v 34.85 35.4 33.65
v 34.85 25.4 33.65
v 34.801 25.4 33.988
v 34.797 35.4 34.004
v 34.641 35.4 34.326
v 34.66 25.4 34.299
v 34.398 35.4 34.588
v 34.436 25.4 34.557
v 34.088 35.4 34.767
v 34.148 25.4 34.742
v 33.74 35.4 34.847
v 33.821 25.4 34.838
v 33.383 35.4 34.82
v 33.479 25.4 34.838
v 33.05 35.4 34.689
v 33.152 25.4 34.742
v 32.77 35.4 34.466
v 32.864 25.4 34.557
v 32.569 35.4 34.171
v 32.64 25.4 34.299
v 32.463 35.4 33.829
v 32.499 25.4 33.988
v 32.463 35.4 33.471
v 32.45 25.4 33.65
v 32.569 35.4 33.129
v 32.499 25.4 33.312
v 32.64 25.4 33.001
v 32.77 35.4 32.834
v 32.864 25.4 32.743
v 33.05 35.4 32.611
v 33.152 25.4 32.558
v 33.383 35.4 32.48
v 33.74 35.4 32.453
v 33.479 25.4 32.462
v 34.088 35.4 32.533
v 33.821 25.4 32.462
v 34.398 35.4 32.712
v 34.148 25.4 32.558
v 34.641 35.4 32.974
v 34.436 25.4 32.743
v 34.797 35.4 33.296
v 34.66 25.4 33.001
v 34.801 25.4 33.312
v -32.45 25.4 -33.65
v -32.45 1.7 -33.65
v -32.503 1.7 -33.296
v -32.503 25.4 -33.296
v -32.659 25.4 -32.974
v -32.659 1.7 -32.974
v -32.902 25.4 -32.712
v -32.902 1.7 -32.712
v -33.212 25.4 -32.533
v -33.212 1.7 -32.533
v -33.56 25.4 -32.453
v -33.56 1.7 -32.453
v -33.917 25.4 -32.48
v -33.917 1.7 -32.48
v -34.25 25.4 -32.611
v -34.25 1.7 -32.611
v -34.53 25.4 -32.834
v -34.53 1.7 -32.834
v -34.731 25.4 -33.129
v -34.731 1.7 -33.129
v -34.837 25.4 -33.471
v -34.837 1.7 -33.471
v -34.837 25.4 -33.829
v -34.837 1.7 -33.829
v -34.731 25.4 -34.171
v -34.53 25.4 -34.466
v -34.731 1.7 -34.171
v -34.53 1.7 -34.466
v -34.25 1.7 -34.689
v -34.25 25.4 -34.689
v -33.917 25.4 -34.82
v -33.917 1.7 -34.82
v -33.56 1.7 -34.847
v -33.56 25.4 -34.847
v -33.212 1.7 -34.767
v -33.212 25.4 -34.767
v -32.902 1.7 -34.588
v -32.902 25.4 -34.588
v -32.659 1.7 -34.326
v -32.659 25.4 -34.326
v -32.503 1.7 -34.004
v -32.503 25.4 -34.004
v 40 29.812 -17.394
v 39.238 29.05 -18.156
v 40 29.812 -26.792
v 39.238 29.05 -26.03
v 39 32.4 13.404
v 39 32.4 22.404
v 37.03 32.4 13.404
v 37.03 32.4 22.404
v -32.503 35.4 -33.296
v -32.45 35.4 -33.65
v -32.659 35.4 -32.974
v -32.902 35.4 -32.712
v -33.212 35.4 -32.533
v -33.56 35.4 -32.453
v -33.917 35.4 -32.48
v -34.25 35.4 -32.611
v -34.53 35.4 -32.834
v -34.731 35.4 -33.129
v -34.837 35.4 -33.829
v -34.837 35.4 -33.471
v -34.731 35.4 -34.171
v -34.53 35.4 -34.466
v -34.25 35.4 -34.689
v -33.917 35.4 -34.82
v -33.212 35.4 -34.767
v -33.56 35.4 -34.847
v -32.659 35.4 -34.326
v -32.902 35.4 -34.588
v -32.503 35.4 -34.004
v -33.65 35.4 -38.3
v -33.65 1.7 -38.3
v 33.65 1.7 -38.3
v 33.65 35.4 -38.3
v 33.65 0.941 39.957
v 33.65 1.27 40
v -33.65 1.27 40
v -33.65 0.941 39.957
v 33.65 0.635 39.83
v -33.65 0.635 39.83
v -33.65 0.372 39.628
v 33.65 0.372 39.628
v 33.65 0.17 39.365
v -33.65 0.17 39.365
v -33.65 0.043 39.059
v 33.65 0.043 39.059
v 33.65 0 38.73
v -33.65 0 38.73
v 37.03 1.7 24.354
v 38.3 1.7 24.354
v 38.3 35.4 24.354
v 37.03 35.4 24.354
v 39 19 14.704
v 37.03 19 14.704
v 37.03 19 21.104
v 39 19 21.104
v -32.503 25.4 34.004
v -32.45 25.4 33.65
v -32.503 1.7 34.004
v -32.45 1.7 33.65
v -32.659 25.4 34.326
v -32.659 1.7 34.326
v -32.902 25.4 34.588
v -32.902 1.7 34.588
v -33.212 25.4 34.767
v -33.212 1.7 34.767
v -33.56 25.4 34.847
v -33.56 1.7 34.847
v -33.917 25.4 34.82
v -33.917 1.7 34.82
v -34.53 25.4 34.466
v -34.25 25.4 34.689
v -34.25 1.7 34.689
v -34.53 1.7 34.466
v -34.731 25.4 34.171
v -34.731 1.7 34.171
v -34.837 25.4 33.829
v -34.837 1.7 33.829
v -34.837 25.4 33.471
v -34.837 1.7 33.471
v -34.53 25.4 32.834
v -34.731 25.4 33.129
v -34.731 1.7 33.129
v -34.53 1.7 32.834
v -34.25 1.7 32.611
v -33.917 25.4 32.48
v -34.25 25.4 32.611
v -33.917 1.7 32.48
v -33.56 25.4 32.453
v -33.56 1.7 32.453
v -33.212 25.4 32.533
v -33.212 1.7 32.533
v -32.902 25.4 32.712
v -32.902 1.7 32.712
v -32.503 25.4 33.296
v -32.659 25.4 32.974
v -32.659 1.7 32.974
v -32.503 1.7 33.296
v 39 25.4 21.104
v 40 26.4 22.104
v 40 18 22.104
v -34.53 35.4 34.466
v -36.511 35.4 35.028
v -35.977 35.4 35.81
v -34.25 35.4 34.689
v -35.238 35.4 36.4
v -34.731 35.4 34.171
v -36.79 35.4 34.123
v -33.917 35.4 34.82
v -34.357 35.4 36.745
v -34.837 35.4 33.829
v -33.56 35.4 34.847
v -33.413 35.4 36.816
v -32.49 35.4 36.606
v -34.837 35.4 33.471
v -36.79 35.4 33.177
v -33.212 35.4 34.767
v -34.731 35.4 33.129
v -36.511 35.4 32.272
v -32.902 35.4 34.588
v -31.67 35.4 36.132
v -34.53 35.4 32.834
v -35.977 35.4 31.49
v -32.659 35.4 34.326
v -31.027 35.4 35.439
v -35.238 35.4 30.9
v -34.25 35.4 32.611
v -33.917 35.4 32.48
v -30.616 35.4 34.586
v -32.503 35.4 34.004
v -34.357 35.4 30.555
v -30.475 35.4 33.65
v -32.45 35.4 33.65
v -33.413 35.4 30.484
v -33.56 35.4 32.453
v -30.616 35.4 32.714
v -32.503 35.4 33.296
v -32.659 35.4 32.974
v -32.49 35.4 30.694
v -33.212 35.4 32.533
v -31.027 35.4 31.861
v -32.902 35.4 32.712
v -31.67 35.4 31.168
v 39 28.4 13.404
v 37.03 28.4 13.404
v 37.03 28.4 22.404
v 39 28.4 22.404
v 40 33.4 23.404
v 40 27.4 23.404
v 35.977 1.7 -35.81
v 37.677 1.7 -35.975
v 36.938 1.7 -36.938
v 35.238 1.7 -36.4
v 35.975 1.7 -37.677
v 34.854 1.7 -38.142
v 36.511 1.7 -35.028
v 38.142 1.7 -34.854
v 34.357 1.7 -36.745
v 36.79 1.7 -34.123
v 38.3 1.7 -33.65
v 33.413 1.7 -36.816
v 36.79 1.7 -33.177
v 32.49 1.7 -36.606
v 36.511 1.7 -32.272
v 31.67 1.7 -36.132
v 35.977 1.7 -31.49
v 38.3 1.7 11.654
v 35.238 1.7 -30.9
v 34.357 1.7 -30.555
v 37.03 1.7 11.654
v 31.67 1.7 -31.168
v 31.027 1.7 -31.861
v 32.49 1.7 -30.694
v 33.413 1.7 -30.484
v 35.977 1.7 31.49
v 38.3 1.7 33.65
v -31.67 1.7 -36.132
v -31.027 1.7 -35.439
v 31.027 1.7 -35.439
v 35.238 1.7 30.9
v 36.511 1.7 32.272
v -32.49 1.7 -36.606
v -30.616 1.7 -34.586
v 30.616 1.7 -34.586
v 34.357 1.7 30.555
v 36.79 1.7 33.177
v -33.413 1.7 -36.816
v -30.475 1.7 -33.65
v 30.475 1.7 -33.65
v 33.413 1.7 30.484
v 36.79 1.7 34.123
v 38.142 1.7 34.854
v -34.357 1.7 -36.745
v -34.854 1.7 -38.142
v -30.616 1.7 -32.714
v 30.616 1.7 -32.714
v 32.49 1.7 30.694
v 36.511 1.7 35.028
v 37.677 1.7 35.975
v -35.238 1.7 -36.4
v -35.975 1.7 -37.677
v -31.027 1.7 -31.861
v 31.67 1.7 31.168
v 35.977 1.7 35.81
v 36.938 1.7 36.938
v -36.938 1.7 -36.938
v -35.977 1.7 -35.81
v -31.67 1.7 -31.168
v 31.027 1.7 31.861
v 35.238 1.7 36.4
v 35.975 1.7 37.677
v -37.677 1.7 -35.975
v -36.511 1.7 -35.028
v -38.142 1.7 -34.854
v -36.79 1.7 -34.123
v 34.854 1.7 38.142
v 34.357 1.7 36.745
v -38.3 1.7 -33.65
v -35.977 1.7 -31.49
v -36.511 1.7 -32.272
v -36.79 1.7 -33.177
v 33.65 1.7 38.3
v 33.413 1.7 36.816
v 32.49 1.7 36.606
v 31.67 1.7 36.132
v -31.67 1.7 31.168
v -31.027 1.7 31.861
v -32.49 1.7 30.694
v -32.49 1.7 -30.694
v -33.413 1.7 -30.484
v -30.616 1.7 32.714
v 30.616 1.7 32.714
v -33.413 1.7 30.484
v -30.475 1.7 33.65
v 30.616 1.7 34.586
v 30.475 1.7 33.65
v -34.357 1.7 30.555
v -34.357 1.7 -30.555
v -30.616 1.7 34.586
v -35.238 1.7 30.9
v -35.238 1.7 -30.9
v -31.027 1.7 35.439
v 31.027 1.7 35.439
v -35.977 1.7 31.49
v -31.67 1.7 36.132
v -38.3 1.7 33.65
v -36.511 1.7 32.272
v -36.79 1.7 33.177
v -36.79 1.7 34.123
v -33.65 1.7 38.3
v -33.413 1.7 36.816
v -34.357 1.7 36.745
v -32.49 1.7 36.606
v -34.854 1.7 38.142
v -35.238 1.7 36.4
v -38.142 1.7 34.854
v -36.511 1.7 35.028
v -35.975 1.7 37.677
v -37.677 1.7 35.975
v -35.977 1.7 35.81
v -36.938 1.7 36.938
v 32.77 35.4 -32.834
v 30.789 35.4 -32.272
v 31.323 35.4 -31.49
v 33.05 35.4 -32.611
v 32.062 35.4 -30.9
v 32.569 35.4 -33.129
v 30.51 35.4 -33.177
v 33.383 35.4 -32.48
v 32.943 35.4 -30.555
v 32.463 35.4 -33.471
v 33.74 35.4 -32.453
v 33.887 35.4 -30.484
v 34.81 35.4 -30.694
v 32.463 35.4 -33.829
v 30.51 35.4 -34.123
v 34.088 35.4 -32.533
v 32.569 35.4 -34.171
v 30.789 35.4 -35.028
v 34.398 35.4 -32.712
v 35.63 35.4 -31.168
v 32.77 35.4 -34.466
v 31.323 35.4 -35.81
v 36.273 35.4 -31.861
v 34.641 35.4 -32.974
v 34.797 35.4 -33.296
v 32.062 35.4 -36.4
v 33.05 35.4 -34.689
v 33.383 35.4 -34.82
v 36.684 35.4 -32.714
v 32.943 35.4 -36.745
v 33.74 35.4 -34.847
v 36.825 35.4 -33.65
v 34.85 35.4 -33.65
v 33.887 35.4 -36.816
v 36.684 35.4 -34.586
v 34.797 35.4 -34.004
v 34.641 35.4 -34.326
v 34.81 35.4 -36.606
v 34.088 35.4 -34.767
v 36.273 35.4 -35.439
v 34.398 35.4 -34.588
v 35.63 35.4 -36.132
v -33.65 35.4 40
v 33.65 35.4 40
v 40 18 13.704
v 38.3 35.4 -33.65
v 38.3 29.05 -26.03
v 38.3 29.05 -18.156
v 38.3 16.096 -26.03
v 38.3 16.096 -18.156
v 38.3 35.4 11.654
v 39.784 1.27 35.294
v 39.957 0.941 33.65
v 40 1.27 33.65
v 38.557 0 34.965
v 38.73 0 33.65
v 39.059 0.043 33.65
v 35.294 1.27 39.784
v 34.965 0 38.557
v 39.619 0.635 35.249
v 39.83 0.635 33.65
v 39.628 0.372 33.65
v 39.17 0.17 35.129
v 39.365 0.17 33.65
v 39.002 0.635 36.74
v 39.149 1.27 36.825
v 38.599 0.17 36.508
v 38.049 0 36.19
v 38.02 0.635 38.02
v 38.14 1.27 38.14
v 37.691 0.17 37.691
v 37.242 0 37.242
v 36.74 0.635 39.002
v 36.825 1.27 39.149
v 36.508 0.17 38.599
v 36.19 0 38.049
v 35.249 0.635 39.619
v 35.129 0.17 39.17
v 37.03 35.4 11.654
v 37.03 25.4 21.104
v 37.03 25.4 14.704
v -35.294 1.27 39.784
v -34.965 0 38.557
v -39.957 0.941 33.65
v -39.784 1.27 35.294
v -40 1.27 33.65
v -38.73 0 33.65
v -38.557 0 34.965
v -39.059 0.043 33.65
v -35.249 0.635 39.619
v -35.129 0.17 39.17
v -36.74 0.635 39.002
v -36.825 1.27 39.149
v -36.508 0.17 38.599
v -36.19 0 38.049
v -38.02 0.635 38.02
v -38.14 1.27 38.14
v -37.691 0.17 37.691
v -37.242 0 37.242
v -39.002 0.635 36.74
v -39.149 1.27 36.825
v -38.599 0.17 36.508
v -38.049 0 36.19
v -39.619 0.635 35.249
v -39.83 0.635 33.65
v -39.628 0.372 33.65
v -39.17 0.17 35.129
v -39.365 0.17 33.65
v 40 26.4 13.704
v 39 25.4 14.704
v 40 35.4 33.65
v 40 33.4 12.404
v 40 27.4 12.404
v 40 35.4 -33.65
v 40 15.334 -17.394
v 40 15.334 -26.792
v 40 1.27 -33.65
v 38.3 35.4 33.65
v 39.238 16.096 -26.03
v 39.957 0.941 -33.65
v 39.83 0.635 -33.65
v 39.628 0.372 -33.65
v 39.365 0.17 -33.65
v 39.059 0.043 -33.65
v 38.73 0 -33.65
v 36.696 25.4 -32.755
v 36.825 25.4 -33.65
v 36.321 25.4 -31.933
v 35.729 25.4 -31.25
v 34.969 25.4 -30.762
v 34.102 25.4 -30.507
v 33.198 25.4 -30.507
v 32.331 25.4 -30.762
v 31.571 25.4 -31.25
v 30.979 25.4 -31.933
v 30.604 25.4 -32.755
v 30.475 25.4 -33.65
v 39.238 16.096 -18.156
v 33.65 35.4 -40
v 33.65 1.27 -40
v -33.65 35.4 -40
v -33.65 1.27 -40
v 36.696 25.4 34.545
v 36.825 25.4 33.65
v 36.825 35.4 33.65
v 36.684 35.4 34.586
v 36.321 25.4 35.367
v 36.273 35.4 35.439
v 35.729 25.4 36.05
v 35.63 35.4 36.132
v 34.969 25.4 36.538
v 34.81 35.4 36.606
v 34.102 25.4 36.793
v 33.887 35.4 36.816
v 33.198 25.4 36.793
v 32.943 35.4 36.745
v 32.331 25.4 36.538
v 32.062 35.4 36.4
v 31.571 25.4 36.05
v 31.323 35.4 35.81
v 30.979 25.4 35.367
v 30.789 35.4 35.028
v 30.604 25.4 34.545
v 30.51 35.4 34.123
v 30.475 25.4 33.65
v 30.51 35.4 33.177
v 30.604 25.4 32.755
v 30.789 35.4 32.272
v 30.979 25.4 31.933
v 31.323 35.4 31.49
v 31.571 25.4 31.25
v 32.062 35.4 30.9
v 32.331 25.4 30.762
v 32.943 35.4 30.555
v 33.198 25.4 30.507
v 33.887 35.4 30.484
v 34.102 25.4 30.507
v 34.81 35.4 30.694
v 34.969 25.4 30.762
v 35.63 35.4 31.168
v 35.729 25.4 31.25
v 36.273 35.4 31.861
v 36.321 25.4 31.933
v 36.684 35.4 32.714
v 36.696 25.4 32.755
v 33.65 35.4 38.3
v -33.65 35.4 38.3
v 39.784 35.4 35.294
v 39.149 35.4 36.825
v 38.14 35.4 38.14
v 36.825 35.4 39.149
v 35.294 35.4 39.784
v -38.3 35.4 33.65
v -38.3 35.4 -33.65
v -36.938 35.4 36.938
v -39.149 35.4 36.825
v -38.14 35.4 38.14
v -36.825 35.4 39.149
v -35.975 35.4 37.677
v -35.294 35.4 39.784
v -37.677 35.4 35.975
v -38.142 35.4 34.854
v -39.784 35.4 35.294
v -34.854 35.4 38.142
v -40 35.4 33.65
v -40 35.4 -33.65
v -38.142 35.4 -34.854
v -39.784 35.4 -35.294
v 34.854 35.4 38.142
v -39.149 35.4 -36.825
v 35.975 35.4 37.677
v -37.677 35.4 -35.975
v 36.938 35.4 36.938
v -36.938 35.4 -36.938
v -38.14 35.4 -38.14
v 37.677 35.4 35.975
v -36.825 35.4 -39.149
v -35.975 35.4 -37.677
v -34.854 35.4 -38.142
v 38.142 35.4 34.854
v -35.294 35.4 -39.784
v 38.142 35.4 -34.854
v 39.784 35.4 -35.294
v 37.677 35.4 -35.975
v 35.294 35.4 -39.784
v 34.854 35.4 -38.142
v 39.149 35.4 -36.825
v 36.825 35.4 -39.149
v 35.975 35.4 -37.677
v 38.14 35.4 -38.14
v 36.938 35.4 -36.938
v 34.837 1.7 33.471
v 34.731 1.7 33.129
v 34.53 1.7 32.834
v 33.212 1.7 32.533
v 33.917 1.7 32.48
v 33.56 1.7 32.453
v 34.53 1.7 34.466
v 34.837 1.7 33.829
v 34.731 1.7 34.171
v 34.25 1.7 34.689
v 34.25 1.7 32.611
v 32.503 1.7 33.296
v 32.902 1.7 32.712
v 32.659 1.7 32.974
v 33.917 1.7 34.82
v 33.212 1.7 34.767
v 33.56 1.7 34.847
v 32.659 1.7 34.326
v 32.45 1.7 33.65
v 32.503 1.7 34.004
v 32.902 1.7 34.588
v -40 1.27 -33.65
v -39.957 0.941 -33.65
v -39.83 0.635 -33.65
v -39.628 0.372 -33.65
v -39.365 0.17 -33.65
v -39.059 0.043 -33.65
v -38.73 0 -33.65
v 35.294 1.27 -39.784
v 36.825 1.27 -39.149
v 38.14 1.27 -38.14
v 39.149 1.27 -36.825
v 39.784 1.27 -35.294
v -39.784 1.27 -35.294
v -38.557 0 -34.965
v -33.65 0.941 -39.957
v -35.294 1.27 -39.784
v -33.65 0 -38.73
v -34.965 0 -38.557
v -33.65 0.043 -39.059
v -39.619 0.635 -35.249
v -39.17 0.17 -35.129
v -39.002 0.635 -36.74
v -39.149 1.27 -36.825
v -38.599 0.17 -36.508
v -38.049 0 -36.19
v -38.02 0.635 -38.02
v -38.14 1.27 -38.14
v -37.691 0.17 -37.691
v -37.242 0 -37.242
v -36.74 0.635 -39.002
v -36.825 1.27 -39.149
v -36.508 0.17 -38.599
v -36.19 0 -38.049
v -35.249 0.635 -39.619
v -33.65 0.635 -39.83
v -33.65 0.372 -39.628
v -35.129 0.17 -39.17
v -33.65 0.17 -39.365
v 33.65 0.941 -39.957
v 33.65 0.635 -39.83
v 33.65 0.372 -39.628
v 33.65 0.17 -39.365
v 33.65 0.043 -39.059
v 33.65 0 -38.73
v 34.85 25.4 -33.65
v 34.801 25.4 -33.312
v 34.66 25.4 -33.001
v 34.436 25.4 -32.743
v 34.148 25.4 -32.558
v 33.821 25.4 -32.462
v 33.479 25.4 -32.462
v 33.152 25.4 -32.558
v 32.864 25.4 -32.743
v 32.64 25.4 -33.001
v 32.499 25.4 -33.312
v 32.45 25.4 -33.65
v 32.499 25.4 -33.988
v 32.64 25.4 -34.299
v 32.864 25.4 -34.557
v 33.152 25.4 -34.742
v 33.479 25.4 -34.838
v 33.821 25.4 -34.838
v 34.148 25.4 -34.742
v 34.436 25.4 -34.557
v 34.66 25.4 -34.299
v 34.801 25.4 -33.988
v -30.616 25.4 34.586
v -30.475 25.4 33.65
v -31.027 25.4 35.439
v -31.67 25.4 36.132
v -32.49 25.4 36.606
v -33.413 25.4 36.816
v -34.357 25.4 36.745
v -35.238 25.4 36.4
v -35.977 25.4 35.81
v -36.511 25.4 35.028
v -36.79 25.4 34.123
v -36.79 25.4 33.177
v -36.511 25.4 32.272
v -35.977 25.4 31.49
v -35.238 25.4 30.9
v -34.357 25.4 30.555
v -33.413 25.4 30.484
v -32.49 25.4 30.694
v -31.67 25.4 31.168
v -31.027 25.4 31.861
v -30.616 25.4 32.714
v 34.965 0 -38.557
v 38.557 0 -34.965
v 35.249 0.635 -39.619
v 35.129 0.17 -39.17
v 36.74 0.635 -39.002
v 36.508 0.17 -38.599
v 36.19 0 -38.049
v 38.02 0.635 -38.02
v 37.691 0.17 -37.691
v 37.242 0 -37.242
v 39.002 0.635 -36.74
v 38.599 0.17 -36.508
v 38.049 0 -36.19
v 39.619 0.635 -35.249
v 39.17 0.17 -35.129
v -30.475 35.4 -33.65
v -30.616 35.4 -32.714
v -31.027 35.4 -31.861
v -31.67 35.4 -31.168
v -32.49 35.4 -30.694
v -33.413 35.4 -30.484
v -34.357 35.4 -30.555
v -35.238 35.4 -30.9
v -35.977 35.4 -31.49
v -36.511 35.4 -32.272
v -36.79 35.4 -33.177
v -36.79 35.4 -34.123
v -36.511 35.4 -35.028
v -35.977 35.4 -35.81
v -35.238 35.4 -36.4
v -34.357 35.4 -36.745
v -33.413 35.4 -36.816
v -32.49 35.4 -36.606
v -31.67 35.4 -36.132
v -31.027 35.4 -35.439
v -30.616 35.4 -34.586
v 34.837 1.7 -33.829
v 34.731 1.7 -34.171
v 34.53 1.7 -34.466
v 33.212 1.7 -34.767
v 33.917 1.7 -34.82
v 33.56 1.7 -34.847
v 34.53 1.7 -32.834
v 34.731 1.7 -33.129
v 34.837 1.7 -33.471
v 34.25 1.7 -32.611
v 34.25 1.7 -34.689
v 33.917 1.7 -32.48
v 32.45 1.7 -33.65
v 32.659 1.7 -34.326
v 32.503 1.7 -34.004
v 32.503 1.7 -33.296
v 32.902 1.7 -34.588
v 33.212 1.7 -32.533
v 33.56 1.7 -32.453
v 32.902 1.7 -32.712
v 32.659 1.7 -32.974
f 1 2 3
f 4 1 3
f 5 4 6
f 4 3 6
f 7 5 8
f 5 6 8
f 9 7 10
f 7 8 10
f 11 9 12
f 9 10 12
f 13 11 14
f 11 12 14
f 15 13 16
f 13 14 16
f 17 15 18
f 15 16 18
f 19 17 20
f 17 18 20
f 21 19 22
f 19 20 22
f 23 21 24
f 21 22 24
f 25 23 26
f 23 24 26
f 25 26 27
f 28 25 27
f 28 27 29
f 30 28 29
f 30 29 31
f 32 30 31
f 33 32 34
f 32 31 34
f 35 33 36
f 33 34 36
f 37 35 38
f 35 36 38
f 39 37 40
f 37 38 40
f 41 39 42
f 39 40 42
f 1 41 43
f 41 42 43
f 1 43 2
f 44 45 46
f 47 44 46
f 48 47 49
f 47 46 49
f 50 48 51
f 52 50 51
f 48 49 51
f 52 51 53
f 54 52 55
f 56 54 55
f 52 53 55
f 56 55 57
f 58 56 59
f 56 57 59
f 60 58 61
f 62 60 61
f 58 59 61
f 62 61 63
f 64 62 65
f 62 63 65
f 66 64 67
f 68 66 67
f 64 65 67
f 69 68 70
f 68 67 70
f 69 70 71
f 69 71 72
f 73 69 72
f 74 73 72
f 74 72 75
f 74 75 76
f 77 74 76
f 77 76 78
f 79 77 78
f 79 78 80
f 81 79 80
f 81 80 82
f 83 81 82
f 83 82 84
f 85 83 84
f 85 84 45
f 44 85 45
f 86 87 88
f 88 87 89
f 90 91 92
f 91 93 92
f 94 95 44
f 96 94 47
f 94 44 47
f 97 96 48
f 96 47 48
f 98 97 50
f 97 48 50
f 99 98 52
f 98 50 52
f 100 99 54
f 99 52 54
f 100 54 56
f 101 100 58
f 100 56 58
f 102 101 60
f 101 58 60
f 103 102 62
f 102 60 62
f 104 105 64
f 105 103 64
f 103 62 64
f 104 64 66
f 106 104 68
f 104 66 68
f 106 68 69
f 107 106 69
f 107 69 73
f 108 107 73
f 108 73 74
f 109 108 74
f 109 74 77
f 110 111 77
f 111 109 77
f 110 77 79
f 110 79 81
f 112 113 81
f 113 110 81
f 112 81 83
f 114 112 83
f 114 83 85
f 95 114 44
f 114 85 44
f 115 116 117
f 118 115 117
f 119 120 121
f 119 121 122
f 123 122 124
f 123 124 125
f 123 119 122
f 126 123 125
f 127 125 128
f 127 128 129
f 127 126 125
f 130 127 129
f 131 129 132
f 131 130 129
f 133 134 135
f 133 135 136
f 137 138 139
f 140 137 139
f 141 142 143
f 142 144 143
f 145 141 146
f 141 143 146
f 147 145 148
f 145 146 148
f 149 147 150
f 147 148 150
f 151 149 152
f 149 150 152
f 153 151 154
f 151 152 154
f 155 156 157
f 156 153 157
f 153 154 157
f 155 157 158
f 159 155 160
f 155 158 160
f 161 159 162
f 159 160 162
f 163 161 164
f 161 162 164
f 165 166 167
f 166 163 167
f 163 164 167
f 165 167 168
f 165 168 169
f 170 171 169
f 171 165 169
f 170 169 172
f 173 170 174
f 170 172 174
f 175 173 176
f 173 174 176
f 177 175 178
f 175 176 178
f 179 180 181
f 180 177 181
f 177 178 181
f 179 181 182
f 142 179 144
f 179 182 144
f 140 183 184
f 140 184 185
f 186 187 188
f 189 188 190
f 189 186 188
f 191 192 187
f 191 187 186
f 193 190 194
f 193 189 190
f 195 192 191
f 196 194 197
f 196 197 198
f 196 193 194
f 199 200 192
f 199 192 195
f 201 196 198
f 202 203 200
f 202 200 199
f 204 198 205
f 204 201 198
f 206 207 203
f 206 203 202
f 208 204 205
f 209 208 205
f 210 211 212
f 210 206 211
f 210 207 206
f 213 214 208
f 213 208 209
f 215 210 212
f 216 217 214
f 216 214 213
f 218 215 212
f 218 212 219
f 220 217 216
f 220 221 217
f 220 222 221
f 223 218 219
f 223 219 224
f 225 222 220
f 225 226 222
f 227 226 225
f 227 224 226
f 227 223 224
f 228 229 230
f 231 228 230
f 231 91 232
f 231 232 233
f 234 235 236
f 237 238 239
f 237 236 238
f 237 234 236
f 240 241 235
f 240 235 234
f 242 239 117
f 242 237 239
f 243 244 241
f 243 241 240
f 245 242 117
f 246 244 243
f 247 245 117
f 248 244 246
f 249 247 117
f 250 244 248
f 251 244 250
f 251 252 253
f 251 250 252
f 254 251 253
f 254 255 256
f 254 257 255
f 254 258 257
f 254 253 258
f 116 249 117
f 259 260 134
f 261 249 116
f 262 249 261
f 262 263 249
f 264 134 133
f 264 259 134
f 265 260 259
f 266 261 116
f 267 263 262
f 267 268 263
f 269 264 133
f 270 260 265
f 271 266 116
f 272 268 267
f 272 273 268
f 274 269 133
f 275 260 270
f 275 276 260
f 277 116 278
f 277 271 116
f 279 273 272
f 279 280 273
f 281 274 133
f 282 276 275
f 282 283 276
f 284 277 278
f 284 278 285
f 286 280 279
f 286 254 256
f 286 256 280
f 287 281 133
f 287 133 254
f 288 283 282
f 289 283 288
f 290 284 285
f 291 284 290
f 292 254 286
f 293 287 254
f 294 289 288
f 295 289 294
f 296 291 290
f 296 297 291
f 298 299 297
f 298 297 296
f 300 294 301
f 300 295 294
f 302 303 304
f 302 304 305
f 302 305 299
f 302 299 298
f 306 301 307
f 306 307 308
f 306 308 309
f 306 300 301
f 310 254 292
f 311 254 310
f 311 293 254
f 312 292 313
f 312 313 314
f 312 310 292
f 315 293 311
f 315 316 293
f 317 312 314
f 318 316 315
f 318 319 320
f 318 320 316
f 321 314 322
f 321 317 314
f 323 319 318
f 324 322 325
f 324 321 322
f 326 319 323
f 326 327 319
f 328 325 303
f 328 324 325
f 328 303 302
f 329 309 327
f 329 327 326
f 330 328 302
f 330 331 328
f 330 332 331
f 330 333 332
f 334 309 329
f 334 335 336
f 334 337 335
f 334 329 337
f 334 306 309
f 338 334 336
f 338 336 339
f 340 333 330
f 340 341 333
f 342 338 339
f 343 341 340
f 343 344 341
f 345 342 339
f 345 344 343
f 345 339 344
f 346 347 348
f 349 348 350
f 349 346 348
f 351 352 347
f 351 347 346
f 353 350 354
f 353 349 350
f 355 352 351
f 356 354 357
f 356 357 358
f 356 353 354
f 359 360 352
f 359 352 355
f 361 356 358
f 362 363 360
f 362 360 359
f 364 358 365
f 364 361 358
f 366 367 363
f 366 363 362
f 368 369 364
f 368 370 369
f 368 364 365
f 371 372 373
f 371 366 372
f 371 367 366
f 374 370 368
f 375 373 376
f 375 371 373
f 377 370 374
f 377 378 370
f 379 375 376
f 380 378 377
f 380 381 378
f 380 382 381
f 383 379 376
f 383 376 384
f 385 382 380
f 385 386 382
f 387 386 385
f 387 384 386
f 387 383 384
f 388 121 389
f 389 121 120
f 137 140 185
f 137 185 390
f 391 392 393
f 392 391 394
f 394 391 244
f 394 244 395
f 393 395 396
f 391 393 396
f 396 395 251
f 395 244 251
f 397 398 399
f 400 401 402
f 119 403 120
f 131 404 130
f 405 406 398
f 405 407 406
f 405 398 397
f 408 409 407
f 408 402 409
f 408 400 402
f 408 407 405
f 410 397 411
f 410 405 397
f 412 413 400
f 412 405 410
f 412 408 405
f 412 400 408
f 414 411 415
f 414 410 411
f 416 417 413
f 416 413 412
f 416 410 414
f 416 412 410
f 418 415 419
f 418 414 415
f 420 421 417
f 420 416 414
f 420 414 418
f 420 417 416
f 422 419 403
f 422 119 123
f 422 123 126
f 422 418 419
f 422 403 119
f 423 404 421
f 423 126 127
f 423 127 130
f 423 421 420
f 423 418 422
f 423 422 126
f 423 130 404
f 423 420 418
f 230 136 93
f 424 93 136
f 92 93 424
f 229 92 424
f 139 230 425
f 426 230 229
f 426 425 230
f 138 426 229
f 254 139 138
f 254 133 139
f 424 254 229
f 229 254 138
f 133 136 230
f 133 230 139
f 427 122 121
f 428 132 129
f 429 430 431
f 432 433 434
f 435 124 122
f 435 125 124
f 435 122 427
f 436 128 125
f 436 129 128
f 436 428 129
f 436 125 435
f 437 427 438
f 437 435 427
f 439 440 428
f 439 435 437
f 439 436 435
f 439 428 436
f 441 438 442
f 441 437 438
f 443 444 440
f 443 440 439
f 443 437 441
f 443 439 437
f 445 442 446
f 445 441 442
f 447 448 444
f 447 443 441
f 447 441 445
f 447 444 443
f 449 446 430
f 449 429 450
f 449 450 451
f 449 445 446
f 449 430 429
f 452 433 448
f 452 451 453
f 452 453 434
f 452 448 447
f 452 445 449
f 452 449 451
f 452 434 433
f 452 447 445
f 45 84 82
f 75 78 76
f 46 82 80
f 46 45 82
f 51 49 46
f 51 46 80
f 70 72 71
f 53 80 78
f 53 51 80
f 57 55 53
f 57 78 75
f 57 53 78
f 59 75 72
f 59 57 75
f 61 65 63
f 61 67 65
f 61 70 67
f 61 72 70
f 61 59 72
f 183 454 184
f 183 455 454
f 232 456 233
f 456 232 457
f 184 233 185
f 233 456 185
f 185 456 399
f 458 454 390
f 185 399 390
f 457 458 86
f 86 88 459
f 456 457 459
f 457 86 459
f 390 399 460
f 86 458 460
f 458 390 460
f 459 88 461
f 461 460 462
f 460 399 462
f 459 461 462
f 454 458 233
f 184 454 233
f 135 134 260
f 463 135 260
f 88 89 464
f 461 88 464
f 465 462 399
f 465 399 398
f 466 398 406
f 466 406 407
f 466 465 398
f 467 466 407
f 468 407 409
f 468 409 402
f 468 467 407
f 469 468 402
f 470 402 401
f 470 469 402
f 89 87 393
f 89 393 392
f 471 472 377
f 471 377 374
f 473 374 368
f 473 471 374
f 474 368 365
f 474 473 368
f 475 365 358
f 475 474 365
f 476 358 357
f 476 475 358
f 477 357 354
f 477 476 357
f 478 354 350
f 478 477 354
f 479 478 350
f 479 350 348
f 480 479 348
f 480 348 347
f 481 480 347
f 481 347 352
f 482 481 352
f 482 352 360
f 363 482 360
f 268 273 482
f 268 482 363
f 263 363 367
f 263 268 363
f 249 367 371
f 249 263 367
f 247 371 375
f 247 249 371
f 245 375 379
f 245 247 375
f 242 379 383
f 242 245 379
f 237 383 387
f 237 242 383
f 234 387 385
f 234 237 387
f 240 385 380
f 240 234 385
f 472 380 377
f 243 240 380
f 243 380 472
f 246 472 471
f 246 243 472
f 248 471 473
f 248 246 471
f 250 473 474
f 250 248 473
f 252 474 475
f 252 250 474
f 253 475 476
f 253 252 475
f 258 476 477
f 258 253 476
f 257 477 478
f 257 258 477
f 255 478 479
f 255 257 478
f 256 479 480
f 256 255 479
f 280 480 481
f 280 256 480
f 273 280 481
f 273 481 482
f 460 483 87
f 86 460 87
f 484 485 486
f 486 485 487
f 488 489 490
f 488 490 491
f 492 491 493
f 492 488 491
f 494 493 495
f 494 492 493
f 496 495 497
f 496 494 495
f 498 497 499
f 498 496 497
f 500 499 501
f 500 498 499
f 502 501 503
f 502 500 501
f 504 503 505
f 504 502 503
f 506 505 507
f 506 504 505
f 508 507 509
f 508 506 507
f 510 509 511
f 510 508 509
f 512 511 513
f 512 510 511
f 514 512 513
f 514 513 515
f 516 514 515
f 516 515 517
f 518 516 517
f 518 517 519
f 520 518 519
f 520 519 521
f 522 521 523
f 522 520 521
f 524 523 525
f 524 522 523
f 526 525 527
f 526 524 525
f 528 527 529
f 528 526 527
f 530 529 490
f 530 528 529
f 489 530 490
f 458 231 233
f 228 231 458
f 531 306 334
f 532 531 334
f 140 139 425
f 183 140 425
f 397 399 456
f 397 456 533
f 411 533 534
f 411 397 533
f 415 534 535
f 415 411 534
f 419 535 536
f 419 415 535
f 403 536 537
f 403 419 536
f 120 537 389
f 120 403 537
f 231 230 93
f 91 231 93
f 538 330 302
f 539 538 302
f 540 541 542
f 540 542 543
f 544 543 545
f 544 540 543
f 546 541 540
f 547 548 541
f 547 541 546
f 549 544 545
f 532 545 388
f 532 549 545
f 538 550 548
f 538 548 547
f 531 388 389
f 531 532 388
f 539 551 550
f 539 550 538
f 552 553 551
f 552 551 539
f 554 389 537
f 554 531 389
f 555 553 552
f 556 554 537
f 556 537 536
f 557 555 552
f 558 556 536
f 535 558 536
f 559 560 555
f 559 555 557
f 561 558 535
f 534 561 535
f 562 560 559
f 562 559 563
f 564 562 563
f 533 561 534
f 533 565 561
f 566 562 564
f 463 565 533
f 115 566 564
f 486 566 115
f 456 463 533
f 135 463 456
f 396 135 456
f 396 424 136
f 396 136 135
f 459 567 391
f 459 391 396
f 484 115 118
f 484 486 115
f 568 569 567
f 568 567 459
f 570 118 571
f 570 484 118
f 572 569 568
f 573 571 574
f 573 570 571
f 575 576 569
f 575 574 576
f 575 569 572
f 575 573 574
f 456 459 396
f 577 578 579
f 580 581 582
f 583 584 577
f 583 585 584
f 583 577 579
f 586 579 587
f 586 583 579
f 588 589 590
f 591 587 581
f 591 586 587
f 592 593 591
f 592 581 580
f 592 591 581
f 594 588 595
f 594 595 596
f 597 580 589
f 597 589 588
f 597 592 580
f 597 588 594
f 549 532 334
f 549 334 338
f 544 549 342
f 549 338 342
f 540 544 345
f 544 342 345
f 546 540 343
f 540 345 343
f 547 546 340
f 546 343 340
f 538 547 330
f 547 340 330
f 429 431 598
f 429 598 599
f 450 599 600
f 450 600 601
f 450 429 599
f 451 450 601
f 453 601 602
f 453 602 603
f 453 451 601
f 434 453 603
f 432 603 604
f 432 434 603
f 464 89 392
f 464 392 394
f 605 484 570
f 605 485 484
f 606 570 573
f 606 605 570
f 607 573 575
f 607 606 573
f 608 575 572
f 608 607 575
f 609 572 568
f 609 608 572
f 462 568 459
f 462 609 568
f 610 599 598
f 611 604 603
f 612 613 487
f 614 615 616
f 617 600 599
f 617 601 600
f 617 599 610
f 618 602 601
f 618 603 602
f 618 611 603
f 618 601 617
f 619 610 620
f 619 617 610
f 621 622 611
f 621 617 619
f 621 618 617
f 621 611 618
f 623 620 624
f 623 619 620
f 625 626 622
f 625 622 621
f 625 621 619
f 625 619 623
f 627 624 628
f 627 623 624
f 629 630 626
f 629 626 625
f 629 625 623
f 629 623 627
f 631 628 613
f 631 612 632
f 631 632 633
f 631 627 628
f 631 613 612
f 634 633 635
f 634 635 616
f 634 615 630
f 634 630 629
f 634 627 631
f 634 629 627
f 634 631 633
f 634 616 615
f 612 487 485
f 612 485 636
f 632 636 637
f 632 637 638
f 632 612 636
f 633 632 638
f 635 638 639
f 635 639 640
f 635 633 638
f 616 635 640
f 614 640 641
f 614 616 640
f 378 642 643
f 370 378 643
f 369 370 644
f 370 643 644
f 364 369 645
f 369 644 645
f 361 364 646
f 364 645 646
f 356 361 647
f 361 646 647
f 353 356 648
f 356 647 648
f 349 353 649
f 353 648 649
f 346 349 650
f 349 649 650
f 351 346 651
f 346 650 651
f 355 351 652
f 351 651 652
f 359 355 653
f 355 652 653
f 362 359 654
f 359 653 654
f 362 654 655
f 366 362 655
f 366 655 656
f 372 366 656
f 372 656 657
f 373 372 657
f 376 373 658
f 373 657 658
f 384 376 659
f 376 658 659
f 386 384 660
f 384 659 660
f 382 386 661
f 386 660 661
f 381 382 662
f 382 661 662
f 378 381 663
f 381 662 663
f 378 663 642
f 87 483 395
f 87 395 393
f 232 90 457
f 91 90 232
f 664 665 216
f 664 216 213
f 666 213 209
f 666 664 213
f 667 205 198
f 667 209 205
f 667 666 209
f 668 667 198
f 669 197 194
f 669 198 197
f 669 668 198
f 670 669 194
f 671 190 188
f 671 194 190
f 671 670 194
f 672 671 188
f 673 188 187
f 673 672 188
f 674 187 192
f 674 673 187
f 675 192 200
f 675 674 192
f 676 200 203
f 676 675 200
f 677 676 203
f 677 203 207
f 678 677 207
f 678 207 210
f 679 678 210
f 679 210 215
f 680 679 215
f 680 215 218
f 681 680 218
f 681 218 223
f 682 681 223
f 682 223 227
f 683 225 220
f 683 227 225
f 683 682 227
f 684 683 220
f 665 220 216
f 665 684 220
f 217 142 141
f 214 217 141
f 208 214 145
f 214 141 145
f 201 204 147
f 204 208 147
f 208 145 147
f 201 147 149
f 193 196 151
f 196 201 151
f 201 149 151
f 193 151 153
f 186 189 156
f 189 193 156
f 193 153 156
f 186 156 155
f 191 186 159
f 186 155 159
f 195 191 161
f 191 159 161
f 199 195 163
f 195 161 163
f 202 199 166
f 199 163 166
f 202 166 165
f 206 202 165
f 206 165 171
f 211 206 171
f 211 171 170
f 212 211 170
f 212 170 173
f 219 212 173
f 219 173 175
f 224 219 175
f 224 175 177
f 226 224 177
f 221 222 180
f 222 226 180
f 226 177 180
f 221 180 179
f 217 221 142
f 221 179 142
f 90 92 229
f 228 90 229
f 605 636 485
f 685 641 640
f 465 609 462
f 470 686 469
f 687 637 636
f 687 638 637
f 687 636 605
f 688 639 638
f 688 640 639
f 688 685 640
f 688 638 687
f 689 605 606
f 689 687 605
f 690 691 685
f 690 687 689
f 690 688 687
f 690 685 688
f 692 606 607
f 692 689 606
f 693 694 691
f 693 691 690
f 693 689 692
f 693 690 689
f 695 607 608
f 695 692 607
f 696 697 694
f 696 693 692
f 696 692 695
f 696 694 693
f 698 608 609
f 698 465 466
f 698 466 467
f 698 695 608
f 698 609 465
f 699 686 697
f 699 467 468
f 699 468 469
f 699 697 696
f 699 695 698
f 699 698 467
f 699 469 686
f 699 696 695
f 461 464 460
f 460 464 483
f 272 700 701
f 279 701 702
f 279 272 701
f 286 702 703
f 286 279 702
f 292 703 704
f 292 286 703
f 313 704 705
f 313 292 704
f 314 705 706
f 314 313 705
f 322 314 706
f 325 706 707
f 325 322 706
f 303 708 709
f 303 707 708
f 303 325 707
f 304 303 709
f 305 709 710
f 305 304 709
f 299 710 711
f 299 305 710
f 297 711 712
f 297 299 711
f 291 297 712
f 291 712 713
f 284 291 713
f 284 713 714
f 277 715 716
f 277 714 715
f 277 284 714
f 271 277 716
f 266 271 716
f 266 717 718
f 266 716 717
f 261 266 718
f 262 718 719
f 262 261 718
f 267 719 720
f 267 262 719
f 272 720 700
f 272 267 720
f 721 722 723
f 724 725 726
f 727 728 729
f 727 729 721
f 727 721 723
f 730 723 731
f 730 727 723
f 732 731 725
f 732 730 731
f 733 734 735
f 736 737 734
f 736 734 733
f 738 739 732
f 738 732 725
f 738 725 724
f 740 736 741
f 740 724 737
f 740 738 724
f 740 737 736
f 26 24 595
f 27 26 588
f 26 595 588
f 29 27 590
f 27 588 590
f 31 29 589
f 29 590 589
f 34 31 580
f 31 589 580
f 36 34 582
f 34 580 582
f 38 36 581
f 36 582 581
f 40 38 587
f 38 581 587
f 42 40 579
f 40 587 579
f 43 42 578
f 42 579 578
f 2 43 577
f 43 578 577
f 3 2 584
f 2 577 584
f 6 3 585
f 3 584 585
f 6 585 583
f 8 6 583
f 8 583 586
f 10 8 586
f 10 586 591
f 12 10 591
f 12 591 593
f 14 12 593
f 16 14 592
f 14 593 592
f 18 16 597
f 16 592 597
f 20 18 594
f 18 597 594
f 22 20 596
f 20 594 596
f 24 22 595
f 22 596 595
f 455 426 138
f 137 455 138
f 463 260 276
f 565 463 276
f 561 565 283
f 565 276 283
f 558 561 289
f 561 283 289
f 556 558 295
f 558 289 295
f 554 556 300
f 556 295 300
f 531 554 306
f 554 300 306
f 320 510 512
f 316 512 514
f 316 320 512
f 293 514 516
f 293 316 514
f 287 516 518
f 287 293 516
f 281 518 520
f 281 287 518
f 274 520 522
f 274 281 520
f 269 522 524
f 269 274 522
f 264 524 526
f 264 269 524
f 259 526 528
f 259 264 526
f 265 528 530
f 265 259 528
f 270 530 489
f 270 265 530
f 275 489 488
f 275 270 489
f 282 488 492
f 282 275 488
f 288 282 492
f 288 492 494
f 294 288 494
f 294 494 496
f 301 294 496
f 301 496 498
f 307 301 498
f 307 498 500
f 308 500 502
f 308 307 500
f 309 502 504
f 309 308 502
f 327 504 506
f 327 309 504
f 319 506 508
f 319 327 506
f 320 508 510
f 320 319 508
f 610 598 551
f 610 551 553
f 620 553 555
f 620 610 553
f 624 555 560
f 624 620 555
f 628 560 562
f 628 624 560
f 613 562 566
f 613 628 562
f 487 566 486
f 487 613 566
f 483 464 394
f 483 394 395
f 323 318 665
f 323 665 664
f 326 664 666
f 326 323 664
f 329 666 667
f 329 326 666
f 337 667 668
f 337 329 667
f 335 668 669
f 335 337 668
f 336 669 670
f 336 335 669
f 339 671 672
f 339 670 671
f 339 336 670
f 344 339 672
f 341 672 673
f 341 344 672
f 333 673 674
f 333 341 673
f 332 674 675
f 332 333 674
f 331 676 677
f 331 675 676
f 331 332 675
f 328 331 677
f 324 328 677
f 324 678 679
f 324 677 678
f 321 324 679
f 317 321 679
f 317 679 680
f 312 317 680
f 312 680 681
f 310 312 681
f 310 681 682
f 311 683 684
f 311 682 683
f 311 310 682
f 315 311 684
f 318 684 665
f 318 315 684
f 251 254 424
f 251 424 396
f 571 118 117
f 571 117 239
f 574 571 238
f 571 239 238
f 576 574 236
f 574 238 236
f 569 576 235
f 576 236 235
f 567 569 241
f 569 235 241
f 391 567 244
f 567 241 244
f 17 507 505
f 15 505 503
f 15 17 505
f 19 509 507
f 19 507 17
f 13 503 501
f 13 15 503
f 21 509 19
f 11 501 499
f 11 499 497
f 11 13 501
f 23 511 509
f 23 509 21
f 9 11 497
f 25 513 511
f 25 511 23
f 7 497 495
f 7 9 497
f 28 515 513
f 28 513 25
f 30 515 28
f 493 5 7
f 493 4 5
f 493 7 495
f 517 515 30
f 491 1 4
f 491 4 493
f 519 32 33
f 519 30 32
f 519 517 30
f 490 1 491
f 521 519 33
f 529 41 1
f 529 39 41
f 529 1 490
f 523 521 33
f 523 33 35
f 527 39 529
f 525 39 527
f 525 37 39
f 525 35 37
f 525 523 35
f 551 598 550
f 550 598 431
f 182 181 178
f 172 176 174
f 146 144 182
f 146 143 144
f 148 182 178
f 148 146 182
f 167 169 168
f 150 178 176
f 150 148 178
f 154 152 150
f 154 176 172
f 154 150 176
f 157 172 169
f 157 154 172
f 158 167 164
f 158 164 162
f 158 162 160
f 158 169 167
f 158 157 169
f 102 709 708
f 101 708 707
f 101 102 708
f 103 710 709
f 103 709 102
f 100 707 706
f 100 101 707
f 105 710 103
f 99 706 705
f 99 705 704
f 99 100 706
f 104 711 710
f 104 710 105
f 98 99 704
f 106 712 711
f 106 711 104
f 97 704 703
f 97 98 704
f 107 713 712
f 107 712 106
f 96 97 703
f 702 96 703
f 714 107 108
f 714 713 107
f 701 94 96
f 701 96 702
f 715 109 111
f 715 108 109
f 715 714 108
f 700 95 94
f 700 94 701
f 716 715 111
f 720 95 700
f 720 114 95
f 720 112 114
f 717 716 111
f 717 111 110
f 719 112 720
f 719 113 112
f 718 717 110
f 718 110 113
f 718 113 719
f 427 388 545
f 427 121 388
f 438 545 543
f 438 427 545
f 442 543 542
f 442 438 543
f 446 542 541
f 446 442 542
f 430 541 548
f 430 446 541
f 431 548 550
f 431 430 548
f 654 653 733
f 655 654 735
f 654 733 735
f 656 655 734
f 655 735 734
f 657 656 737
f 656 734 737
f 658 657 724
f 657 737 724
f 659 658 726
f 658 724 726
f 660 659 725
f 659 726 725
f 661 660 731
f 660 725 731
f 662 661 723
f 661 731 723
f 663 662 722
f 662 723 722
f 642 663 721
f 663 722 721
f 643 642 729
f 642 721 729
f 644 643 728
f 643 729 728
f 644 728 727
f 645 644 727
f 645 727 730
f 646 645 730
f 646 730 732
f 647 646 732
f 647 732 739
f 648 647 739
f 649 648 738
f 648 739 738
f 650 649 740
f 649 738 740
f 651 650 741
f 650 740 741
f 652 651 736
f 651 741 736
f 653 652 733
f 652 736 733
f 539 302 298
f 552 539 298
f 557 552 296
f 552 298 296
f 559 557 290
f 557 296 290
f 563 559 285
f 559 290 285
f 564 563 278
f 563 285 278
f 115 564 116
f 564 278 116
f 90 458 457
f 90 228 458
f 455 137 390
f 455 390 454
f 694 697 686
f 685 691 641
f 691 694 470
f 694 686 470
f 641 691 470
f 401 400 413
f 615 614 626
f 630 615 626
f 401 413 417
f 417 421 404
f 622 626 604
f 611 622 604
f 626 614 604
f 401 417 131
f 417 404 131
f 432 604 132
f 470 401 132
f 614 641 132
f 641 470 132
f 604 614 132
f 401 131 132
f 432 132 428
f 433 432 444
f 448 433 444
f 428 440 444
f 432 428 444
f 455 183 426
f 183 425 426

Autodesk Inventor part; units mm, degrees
ref_plane "YZ Plane" through (0, 0, 0) normal (1, 0, 0) x (0, 1, 0)
ref_plane "XZ Plane" through (0, 0, 0) normal (0, 1, 0) x (-1, 0, 0)
ref_plane "XY Plane" through (0, 0, 0) normal (0, 0, 1) x (1, 0, 0)
sketch "Sketch1" plane through (0, 0, 0) normal (0, 1, 0) x (-1, 0, 0)
  line L0 (-33.65, -40) -> (33.65, -40)
  line L1 (40, -33.65) -> (40, 33.65)
  line L2 (33.65, 40) -> (-33.65, 40)
  line L3 (-40, 33.65) -> (-40, -33.65)
  line L4 (-40, -40) -> (40, 40) construction
  line L5 (40, -40) -> (-40, 40) construction
  arc A0 (40, 33.65) -> (33.65, 40) centre (33.65, 33.65) ccw
  arc A1 (-33.65, 40) -> (-40, 33.65) centre (-33.65, 33.65) ccw
  arc A2 (-40, -33.65) -> (-33.65, -40) centre (-33.65, -33.65) ccw
  arc A3 (33.65, -40) -> (40, -33.65) centre (33.65, -33.65) ccw
  point P0 (0, 0)
  dimension "d0" = 80
  dimension "d1" = 80
  dimension "d2" = 6.35
extrude "Extrusion1" add sketch "Sketch1" along normal blind 25.4
shell "Shell1" thickness 1.7 removed faces 1 at (-11.2167, 25.4, 9.1)
fillet "Fillet1" radius 1.27 8 edges at (-38.1401, 0, -38.1401) (-40, 0, 0) (-38.1401, 0, 38.1401) (0, 0, 40) (38.1401, 0, 38.1401) (40, 0, 0) (38.1401, 0, -38.1401) (0, 0, -40)
sketch "Sketch2" plane through (-33.65, 1.7, 38.3) normal (0, 1, 0) x (1, 0, 0)
  arc A0 (-4.65, 4.65) -> (0, 0) centre (0, 4.65) ccw projected
  circle A1 centre (0, 4.65) radius 3.175
  circle A2 centre (0, 4.65) radius 1.2
  point P0 (33.65, 38.3)
  dimension "d7" = 6.35
  dimension "d8" = 2.4
extrude "Extrusion2" add sketch "Sketch2" along normal up to surface (23.7 mm away)
mirror "Mirror1" about plane through (0, 0, 0) normal (1, 0, 0) of "Extrusion2"
mirror "Mirror2" about plane through (0, 0, 0) normal (0, 0, 1) of "Extrusion2", "Mirror1"
sketch "Sketch4" plane through (0, 25.4, 0) normal (0, 1, 0) x (1, 0, 0)
  line L0 (-38.3, -33.65) -> (-38.3, 33.65) projected
  arc A0 (-33.65, 38.3) -> (-38.3, 33.65) centre (-33.65, 33.65) ccw projected
  line L1 (-33.65, 38.3) -> (33.65, 38.3) projected
  arc A1 (38.3, 33.65) -> (33.65, 38.3) centre (33.65, 33.65) ccw projected
  line L2 (38.3, 33.65) -> (38.3, -33.65) projected
  arc A2 (33.65, -38.3) -> (38.3, -33.65) centre (33.65, -33.65) ccw projected
  line L3 (33.65, -38.3) -> (-33.65, -38.3) projected
  arc A3 (-38.3, -33.65) -> (-33.65, -38.3) centre (-33.65, -33.65) ccw projected
  arc A4 (-40, -33.65) -> (-33.65, -40) centre (-33.65, -33.65) ccw projected
  line L4 (-33.65, -40) -> (33.65, -40) projected
  arc A5 (33.65, -40) -> (40, -33.65) centre (33.65, -33.65) ccw projected
  line L5 (40, -33.65) -> (40, 33.65) projected
  arc A6 (40, 33.65) -> (33.65, 40) centre (33.65, 33.65) ccw projected
  line L6 (33.65, 40) -> (-33.65, 40) projected
  arc A7 (-33.65, 40) -> (-40, 33.65) centre (-33.65, 33.65) ccw projected
  line L7 (-40, 33.65) -> (-40, -33.65) projected
  circle A8 centre (-33.65, 33.65) radius 1.2 projected
  circle A9 centre (-33.65, 33.65) radius 3.175 projected
  circle A10 centre (-33.65, -33.65) radius 1.2 projected
  circle A11 centre (-33.65, -33.65) radius 3.175 projected
  circle A12 centre (33.65, -33.65) radius 1.2 projected
  circle A13 centre (33.65, -33.65) radius 3.175 projected
  circle A14 centre (33.65, 33.65) radius 1.2 projected
  circle A15 centre (33.65, 33.65) radius 3.175 projected
  point P0 (0, 0)
extrude "Extrusion4" add sketch "Sketch4" along normal blind 10
sketch "Sketch5" plane through (-33.65, 1.7, 38.3) normal (0, 1, 0) x (1, 0, 0)
  line L0 (71.95, 71.95) -> (71.95, 4.65) projected
  line L1 (71.95, 13.9457) -> (70.68, 13.9457)
  line L2 (70.68, 13.9457) -> (70.68, 26.6457)
  line L3 (70.68, 26.6457) -> (71.95, 26.6457)
  line L4 (71.95, 26.6457) -> (71.95, 13.9457)
  point P0 (33.65, 38.3)
  dimension "d18" = 1.27
  dimension "d19" = 12.7
extrude "Extrusion5" add sketch "Sketch5" along normal up to surface (33.7 mm away)
sketch "Sketch6" plane through (37.03, 1.7, 11.6543) normal (-1, 0, 0) x (0, 0, 1)
  line L0 (10.75, 30.7) -> (1.75, 30.7)
  line L1 (1.75, 30.7) -> (1.75, 26.7)
  line L2 (1.75, 26.7) -> (10.75, 26.7)
  line L3 (10.75, 26.7) -> (10.75, 30.7)
  line L4 (0, 0) -> (0, 33.7) projected
  line L5 (21.9957, 33.7) -> (-45.3043, 33.7) projected
  line L6 (3.05, 17.3) -> (9.45, 17.3)
  line L7 (9.45, 17.3) -> (9.45, 23.7)
  line L8 (9.45, 23.7) -> (3.05, 23.7)
  line L9 (3.05, 23.7) -> (3.05, 17.3)
  line L10 (3.05, 17.3) -> (9.45, 23.7) construction
  line L11 (9.45, 17.3) -> (3.05, 23.7) construction
  point P0 (-11.6543, -1.7)
  point P1 (6.25, 20.5)
  dimension "d22" = 9
  dimension "d23" = 4
  dimension "d24" = 1.75
  dimension "d25" = 3
  dimension "d26" = 6.4
  dimension "d27" = 6.4
  dimension "d28" = 3
extrude "Extrusion6" cut sketch "Sketch6" against normal blind 10
chamfer "Chamfer1" distance 1 angle 45 8 edges at (40, 28.4, 17.9043) (40, 30.4, 22.4043) (40, 32.4, 17.9043) (40, 30.4, 13.4043) (40, 22.2, 21.1043) (40, 22.2, 14.7043) (40, 19, 17.9043) (40, 25.4, 17.9043)
sketch "Sketch7" plane through (40, 1.27, 33.65) normal (1, 0, 0) x (0, 0, -1)
  line L0 (59.68, 14.826) -> (51.806, 14.826)
  line L1 (51.806, 14.826) -> (51.806, 27.78)
  line L2 (51.806, 27.78) -> (59.68, 27.78)
  line L3 (59.68, 27.78) -> (59.68, 14.826)
  line L4 (59.68, 14.826) -> (51.806, 27.78) construction
  line L5 (51.806, 14.826) -> (59.68, 27.78) construction
  line L6 (0, 34.13) -> (67.3, 34.13) projected
  line L7 (67.3, 0) -> (67.3, 34.13) projected
  point P0 (33.65, -1.27)
  point P1 (55.743, 21.303)
  dimension "d34" = 7.874
  dimension "d35" = 12.954
  dimension "d36" = 6.35
  dimension "d37" = 7.62
extrude "Extrusion7" cut sketch "Sketch7" against normal blind 25.4
chamfer "Chamfer2" distance 0.762 angle 45 4 edges at (40, 22.573, -18.156) (40, 16.096, -22.093) (40, 29.05, -22.093) (40, 22.573, -26.03)
properties part number "Arduino_case_bottom_JC_Rev2"
